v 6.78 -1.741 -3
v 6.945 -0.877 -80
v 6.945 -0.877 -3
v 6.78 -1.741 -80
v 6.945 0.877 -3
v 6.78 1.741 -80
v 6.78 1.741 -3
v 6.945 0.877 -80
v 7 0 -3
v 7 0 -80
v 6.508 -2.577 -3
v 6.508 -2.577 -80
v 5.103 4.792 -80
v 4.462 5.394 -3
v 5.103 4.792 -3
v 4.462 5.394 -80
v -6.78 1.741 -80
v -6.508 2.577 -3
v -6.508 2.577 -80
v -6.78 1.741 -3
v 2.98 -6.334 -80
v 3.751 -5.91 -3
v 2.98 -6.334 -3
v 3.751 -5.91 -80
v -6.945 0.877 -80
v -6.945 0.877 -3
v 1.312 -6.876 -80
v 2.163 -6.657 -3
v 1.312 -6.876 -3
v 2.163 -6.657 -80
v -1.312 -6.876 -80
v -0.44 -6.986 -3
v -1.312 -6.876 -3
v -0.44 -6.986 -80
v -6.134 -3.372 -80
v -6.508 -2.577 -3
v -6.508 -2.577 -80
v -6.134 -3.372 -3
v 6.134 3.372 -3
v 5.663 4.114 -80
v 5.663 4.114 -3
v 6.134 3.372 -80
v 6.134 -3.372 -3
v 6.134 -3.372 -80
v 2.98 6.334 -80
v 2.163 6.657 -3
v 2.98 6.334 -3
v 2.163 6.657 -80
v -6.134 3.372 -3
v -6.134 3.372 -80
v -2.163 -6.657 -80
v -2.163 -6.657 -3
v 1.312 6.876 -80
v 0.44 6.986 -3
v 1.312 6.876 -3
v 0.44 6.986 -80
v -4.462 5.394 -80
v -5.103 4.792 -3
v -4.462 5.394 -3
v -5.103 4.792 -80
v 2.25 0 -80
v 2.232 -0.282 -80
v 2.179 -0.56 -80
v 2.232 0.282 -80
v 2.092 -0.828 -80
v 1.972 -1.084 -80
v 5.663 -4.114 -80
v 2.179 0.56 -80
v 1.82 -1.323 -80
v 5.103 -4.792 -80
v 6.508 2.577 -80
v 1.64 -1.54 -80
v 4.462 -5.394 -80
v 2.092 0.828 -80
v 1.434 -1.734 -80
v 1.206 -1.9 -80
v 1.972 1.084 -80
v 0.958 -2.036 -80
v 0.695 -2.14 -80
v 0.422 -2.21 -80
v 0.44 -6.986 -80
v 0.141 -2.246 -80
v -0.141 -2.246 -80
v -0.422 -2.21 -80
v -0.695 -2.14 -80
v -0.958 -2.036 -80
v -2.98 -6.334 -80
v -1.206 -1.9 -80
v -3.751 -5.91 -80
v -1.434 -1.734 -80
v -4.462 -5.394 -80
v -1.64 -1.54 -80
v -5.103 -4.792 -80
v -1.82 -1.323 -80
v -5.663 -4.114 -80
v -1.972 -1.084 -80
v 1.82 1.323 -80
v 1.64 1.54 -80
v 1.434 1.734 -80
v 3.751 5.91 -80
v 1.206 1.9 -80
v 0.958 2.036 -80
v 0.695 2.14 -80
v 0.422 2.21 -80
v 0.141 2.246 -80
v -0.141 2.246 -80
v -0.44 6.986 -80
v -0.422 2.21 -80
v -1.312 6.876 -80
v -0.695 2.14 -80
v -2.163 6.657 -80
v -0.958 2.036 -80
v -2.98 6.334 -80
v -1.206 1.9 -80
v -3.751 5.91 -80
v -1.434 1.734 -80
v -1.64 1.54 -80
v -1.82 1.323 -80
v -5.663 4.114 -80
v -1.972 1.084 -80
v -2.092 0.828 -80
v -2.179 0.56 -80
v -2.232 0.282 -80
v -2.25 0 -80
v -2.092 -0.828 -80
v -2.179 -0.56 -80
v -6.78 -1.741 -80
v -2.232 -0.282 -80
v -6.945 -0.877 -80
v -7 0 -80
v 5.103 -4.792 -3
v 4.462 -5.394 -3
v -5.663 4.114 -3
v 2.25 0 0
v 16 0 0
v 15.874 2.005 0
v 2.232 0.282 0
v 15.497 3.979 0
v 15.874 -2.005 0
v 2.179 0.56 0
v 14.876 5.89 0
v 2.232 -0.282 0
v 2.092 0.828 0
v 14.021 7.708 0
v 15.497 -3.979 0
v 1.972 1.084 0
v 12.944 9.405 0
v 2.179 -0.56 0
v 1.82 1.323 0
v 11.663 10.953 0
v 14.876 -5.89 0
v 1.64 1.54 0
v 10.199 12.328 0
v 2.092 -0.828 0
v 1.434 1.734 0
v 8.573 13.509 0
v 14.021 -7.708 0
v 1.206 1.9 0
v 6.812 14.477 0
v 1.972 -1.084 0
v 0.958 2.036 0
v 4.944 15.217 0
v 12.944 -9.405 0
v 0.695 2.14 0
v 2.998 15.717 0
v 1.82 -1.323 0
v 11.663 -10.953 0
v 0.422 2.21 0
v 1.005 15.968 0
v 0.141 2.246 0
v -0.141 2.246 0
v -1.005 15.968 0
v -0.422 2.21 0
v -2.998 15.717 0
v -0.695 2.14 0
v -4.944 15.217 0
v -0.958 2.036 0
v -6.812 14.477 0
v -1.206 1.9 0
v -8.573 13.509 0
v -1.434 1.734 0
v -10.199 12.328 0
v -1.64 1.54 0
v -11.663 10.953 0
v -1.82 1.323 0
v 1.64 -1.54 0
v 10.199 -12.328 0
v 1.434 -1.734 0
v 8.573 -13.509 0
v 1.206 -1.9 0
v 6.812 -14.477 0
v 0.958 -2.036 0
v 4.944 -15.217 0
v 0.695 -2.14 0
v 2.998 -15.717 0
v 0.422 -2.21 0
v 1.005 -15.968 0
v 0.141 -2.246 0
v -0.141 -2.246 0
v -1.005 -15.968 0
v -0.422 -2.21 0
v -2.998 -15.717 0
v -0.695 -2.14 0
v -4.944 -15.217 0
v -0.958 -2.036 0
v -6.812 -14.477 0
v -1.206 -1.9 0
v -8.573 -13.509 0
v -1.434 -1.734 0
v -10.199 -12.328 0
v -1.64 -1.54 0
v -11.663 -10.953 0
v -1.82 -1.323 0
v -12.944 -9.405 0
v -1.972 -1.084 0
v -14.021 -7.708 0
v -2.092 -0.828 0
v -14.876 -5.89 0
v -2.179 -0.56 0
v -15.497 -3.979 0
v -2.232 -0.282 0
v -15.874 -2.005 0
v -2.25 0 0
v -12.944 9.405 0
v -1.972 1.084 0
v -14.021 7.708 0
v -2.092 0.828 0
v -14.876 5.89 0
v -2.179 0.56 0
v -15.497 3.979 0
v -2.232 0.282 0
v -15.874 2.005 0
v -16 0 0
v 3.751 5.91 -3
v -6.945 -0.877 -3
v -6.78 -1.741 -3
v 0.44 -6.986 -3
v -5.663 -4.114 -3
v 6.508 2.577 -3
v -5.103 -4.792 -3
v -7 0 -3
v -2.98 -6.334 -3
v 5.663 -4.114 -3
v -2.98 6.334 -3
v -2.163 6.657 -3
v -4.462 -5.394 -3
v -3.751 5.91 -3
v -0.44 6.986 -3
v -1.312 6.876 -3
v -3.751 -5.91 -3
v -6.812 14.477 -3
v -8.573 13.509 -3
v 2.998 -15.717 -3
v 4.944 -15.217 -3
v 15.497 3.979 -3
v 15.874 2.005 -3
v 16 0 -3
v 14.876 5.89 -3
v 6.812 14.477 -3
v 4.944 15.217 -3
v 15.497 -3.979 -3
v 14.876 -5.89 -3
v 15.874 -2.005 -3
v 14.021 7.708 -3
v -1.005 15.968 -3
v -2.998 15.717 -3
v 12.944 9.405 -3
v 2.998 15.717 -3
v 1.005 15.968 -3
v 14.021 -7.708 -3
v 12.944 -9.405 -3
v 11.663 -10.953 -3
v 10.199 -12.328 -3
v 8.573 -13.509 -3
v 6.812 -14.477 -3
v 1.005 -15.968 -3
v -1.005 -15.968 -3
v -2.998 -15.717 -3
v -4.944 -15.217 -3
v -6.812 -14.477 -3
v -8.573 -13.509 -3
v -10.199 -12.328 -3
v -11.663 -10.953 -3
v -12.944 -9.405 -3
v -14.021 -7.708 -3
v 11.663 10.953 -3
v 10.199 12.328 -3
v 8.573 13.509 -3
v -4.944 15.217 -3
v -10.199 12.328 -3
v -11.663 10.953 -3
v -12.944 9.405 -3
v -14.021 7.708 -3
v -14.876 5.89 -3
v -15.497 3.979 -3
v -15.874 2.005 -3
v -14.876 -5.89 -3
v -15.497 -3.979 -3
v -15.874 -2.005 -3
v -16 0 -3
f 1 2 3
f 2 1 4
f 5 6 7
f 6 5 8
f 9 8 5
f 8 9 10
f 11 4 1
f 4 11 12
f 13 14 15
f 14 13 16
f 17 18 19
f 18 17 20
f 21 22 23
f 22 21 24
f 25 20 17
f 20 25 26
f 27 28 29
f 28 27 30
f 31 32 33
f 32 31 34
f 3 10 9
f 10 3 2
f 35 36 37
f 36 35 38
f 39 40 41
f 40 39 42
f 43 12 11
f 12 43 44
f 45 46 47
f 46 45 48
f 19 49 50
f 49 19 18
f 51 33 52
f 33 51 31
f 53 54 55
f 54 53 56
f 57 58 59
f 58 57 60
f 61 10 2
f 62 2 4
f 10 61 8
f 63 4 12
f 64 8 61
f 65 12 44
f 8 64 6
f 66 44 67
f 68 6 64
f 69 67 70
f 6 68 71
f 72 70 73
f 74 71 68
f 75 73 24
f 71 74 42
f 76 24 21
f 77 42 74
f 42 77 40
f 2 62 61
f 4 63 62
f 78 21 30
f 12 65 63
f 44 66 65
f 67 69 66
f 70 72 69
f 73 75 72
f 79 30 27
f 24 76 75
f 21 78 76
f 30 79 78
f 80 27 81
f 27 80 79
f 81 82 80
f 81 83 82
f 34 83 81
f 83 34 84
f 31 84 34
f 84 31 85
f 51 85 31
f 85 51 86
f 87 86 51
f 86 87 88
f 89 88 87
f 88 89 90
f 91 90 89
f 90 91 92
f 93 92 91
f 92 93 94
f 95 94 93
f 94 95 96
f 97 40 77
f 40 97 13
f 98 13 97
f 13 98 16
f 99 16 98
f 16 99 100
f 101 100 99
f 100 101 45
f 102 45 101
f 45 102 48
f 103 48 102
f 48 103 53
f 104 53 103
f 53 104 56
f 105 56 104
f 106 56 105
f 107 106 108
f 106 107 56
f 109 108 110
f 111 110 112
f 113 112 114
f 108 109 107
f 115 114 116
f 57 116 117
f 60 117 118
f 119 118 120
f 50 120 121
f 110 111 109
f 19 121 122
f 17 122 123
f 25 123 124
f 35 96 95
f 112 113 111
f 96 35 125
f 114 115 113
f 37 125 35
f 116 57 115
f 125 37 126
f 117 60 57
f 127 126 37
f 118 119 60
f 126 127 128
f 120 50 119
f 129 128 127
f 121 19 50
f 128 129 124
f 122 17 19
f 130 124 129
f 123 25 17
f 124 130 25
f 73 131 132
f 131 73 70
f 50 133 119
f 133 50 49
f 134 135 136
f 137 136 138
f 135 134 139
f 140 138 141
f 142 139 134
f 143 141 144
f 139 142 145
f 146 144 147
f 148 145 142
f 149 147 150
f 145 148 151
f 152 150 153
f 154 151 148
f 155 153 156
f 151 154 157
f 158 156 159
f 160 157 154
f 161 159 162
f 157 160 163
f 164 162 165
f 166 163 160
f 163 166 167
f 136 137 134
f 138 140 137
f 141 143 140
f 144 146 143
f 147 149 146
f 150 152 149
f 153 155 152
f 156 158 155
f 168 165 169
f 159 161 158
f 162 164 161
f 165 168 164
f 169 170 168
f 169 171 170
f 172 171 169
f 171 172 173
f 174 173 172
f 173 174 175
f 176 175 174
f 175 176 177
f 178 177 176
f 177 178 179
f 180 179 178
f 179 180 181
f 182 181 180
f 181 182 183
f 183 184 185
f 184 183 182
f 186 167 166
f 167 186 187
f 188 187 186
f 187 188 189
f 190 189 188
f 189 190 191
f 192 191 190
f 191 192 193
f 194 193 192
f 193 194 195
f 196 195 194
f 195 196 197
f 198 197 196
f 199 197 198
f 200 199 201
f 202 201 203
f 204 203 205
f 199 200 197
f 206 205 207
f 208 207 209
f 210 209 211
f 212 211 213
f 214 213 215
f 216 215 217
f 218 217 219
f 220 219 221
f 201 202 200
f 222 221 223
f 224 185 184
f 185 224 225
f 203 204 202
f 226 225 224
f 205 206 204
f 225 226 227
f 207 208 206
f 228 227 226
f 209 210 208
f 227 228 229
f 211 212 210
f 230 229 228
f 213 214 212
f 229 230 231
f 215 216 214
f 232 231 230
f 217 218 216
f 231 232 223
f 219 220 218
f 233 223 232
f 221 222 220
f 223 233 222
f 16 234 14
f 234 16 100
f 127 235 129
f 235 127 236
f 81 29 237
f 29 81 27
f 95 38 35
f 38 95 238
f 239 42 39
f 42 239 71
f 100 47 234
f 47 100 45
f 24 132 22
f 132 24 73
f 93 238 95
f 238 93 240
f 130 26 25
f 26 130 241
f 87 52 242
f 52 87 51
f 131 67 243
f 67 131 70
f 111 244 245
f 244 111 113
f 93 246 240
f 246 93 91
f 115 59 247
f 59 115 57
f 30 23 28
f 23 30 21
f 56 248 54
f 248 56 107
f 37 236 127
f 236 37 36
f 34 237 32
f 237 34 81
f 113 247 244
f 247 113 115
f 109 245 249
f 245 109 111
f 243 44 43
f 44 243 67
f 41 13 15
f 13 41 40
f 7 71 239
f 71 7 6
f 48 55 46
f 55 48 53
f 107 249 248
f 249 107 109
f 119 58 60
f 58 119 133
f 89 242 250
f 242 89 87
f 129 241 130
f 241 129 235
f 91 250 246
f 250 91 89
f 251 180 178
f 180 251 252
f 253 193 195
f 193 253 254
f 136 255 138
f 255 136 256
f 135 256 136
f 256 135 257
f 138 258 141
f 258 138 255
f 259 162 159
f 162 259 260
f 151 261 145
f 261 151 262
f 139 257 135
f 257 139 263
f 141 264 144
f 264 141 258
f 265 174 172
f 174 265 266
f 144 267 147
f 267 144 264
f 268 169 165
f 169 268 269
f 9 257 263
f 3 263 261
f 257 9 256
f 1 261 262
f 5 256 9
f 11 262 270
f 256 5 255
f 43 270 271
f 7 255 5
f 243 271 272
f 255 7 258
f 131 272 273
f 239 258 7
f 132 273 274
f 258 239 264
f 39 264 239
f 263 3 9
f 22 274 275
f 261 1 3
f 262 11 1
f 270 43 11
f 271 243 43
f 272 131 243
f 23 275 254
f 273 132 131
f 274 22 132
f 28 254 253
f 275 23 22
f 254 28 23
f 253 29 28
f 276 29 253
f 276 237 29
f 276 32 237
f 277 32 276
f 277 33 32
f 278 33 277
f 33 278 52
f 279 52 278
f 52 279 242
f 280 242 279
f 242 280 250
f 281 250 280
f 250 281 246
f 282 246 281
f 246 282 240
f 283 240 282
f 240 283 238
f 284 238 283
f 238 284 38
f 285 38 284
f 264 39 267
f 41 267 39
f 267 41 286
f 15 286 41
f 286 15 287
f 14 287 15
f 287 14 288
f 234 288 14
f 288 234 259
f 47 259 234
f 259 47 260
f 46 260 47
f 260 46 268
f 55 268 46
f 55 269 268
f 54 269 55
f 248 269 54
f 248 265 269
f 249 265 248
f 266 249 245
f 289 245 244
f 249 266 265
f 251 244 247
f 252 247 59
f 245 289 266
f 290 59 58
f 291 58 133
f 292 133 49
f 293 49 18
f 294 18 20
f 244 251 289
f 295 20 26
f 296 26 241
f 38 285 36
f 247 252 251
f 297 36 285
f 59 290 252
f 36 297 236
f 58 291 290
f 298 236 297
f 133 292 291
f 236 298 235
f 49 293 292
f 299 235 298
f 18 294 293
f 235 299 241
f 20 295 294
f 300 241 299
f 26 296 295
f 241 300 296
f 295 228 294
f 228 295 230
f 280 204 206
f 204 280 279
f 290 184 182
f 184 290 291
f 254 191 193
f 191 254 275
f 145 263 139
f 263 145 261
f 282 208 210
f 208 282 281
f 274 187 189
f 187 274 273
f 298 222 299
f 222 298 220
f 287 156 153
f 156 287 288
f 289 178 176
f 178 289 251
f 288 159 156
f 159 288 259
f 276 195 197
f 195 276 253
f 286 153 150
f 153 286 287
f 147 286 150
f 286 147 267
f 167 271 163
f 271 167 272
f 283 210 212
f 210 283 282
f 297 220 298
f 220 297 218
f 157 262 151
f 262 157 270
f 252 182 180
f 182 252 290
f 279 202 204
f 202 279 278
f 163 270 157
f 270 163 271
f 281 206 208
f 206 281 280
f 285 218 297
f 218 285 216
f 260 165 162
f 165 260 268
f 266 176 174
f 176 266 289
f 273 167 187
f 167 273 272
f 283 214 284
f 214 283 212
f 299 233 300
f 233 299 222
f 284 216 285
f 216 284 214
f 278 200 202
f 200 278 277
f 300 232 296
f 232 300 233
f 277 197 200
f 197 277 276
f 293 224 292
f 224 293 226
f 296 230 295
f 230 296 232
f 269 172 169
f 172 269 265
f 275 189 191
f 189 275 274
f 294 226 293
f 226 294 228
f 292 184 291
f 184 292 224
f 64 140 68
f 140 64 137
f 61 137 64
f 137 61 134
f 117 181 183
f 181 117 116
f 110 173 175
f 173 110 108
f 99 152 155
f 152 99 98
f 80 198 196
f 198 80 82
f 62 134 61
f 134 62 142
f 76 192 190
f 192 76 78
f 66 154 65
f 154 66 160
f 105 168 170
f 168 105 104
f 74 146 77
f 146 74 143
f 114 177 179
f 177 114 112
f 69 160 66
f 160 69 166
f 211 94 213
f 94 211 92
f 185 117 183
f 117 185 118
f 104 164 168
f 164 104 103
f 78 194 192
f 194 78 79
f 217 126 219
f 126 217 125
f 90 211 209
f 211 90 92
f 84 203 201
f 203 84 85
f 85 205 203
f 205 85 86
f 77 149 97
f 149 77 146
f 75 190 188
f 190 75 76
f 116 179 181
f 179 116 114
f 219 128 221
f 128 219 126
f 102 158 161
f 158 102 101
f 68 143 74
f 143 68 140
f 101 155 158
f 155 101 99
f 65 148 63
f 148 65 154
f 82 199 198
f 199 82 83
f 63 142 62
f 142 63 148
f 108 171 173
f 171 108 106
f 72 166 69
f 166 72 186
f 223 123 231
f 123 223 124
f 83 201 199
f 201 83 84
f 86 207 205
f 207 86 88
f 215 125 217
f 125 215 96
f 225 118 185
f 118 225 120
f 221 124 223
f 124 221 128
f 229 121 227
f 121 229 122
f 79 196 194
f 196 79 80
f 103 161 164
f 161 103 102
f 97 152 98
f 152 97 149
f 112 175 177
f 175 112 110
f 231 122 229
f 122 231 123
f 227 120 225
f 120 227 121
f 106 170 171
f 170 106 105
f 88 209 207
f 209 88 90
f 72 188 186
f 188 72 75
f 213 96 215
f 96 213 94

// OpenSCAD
$fn = 50;


difference() {
	union() {
		translate(v = [0, 0, -80.0000000000]) {
			cylinder(h = 80, r = 7.0000000000);
		}
		translate(v = [0, 0, -3.0000000000]) {
			cylinder(h = 3, r = 16.0000000000);
		}
	}
	union() {
		#translate(v = [0, 0, -80]) {
			cylinder(h = 80, r = 2.2500000000);
		}
	}
}
